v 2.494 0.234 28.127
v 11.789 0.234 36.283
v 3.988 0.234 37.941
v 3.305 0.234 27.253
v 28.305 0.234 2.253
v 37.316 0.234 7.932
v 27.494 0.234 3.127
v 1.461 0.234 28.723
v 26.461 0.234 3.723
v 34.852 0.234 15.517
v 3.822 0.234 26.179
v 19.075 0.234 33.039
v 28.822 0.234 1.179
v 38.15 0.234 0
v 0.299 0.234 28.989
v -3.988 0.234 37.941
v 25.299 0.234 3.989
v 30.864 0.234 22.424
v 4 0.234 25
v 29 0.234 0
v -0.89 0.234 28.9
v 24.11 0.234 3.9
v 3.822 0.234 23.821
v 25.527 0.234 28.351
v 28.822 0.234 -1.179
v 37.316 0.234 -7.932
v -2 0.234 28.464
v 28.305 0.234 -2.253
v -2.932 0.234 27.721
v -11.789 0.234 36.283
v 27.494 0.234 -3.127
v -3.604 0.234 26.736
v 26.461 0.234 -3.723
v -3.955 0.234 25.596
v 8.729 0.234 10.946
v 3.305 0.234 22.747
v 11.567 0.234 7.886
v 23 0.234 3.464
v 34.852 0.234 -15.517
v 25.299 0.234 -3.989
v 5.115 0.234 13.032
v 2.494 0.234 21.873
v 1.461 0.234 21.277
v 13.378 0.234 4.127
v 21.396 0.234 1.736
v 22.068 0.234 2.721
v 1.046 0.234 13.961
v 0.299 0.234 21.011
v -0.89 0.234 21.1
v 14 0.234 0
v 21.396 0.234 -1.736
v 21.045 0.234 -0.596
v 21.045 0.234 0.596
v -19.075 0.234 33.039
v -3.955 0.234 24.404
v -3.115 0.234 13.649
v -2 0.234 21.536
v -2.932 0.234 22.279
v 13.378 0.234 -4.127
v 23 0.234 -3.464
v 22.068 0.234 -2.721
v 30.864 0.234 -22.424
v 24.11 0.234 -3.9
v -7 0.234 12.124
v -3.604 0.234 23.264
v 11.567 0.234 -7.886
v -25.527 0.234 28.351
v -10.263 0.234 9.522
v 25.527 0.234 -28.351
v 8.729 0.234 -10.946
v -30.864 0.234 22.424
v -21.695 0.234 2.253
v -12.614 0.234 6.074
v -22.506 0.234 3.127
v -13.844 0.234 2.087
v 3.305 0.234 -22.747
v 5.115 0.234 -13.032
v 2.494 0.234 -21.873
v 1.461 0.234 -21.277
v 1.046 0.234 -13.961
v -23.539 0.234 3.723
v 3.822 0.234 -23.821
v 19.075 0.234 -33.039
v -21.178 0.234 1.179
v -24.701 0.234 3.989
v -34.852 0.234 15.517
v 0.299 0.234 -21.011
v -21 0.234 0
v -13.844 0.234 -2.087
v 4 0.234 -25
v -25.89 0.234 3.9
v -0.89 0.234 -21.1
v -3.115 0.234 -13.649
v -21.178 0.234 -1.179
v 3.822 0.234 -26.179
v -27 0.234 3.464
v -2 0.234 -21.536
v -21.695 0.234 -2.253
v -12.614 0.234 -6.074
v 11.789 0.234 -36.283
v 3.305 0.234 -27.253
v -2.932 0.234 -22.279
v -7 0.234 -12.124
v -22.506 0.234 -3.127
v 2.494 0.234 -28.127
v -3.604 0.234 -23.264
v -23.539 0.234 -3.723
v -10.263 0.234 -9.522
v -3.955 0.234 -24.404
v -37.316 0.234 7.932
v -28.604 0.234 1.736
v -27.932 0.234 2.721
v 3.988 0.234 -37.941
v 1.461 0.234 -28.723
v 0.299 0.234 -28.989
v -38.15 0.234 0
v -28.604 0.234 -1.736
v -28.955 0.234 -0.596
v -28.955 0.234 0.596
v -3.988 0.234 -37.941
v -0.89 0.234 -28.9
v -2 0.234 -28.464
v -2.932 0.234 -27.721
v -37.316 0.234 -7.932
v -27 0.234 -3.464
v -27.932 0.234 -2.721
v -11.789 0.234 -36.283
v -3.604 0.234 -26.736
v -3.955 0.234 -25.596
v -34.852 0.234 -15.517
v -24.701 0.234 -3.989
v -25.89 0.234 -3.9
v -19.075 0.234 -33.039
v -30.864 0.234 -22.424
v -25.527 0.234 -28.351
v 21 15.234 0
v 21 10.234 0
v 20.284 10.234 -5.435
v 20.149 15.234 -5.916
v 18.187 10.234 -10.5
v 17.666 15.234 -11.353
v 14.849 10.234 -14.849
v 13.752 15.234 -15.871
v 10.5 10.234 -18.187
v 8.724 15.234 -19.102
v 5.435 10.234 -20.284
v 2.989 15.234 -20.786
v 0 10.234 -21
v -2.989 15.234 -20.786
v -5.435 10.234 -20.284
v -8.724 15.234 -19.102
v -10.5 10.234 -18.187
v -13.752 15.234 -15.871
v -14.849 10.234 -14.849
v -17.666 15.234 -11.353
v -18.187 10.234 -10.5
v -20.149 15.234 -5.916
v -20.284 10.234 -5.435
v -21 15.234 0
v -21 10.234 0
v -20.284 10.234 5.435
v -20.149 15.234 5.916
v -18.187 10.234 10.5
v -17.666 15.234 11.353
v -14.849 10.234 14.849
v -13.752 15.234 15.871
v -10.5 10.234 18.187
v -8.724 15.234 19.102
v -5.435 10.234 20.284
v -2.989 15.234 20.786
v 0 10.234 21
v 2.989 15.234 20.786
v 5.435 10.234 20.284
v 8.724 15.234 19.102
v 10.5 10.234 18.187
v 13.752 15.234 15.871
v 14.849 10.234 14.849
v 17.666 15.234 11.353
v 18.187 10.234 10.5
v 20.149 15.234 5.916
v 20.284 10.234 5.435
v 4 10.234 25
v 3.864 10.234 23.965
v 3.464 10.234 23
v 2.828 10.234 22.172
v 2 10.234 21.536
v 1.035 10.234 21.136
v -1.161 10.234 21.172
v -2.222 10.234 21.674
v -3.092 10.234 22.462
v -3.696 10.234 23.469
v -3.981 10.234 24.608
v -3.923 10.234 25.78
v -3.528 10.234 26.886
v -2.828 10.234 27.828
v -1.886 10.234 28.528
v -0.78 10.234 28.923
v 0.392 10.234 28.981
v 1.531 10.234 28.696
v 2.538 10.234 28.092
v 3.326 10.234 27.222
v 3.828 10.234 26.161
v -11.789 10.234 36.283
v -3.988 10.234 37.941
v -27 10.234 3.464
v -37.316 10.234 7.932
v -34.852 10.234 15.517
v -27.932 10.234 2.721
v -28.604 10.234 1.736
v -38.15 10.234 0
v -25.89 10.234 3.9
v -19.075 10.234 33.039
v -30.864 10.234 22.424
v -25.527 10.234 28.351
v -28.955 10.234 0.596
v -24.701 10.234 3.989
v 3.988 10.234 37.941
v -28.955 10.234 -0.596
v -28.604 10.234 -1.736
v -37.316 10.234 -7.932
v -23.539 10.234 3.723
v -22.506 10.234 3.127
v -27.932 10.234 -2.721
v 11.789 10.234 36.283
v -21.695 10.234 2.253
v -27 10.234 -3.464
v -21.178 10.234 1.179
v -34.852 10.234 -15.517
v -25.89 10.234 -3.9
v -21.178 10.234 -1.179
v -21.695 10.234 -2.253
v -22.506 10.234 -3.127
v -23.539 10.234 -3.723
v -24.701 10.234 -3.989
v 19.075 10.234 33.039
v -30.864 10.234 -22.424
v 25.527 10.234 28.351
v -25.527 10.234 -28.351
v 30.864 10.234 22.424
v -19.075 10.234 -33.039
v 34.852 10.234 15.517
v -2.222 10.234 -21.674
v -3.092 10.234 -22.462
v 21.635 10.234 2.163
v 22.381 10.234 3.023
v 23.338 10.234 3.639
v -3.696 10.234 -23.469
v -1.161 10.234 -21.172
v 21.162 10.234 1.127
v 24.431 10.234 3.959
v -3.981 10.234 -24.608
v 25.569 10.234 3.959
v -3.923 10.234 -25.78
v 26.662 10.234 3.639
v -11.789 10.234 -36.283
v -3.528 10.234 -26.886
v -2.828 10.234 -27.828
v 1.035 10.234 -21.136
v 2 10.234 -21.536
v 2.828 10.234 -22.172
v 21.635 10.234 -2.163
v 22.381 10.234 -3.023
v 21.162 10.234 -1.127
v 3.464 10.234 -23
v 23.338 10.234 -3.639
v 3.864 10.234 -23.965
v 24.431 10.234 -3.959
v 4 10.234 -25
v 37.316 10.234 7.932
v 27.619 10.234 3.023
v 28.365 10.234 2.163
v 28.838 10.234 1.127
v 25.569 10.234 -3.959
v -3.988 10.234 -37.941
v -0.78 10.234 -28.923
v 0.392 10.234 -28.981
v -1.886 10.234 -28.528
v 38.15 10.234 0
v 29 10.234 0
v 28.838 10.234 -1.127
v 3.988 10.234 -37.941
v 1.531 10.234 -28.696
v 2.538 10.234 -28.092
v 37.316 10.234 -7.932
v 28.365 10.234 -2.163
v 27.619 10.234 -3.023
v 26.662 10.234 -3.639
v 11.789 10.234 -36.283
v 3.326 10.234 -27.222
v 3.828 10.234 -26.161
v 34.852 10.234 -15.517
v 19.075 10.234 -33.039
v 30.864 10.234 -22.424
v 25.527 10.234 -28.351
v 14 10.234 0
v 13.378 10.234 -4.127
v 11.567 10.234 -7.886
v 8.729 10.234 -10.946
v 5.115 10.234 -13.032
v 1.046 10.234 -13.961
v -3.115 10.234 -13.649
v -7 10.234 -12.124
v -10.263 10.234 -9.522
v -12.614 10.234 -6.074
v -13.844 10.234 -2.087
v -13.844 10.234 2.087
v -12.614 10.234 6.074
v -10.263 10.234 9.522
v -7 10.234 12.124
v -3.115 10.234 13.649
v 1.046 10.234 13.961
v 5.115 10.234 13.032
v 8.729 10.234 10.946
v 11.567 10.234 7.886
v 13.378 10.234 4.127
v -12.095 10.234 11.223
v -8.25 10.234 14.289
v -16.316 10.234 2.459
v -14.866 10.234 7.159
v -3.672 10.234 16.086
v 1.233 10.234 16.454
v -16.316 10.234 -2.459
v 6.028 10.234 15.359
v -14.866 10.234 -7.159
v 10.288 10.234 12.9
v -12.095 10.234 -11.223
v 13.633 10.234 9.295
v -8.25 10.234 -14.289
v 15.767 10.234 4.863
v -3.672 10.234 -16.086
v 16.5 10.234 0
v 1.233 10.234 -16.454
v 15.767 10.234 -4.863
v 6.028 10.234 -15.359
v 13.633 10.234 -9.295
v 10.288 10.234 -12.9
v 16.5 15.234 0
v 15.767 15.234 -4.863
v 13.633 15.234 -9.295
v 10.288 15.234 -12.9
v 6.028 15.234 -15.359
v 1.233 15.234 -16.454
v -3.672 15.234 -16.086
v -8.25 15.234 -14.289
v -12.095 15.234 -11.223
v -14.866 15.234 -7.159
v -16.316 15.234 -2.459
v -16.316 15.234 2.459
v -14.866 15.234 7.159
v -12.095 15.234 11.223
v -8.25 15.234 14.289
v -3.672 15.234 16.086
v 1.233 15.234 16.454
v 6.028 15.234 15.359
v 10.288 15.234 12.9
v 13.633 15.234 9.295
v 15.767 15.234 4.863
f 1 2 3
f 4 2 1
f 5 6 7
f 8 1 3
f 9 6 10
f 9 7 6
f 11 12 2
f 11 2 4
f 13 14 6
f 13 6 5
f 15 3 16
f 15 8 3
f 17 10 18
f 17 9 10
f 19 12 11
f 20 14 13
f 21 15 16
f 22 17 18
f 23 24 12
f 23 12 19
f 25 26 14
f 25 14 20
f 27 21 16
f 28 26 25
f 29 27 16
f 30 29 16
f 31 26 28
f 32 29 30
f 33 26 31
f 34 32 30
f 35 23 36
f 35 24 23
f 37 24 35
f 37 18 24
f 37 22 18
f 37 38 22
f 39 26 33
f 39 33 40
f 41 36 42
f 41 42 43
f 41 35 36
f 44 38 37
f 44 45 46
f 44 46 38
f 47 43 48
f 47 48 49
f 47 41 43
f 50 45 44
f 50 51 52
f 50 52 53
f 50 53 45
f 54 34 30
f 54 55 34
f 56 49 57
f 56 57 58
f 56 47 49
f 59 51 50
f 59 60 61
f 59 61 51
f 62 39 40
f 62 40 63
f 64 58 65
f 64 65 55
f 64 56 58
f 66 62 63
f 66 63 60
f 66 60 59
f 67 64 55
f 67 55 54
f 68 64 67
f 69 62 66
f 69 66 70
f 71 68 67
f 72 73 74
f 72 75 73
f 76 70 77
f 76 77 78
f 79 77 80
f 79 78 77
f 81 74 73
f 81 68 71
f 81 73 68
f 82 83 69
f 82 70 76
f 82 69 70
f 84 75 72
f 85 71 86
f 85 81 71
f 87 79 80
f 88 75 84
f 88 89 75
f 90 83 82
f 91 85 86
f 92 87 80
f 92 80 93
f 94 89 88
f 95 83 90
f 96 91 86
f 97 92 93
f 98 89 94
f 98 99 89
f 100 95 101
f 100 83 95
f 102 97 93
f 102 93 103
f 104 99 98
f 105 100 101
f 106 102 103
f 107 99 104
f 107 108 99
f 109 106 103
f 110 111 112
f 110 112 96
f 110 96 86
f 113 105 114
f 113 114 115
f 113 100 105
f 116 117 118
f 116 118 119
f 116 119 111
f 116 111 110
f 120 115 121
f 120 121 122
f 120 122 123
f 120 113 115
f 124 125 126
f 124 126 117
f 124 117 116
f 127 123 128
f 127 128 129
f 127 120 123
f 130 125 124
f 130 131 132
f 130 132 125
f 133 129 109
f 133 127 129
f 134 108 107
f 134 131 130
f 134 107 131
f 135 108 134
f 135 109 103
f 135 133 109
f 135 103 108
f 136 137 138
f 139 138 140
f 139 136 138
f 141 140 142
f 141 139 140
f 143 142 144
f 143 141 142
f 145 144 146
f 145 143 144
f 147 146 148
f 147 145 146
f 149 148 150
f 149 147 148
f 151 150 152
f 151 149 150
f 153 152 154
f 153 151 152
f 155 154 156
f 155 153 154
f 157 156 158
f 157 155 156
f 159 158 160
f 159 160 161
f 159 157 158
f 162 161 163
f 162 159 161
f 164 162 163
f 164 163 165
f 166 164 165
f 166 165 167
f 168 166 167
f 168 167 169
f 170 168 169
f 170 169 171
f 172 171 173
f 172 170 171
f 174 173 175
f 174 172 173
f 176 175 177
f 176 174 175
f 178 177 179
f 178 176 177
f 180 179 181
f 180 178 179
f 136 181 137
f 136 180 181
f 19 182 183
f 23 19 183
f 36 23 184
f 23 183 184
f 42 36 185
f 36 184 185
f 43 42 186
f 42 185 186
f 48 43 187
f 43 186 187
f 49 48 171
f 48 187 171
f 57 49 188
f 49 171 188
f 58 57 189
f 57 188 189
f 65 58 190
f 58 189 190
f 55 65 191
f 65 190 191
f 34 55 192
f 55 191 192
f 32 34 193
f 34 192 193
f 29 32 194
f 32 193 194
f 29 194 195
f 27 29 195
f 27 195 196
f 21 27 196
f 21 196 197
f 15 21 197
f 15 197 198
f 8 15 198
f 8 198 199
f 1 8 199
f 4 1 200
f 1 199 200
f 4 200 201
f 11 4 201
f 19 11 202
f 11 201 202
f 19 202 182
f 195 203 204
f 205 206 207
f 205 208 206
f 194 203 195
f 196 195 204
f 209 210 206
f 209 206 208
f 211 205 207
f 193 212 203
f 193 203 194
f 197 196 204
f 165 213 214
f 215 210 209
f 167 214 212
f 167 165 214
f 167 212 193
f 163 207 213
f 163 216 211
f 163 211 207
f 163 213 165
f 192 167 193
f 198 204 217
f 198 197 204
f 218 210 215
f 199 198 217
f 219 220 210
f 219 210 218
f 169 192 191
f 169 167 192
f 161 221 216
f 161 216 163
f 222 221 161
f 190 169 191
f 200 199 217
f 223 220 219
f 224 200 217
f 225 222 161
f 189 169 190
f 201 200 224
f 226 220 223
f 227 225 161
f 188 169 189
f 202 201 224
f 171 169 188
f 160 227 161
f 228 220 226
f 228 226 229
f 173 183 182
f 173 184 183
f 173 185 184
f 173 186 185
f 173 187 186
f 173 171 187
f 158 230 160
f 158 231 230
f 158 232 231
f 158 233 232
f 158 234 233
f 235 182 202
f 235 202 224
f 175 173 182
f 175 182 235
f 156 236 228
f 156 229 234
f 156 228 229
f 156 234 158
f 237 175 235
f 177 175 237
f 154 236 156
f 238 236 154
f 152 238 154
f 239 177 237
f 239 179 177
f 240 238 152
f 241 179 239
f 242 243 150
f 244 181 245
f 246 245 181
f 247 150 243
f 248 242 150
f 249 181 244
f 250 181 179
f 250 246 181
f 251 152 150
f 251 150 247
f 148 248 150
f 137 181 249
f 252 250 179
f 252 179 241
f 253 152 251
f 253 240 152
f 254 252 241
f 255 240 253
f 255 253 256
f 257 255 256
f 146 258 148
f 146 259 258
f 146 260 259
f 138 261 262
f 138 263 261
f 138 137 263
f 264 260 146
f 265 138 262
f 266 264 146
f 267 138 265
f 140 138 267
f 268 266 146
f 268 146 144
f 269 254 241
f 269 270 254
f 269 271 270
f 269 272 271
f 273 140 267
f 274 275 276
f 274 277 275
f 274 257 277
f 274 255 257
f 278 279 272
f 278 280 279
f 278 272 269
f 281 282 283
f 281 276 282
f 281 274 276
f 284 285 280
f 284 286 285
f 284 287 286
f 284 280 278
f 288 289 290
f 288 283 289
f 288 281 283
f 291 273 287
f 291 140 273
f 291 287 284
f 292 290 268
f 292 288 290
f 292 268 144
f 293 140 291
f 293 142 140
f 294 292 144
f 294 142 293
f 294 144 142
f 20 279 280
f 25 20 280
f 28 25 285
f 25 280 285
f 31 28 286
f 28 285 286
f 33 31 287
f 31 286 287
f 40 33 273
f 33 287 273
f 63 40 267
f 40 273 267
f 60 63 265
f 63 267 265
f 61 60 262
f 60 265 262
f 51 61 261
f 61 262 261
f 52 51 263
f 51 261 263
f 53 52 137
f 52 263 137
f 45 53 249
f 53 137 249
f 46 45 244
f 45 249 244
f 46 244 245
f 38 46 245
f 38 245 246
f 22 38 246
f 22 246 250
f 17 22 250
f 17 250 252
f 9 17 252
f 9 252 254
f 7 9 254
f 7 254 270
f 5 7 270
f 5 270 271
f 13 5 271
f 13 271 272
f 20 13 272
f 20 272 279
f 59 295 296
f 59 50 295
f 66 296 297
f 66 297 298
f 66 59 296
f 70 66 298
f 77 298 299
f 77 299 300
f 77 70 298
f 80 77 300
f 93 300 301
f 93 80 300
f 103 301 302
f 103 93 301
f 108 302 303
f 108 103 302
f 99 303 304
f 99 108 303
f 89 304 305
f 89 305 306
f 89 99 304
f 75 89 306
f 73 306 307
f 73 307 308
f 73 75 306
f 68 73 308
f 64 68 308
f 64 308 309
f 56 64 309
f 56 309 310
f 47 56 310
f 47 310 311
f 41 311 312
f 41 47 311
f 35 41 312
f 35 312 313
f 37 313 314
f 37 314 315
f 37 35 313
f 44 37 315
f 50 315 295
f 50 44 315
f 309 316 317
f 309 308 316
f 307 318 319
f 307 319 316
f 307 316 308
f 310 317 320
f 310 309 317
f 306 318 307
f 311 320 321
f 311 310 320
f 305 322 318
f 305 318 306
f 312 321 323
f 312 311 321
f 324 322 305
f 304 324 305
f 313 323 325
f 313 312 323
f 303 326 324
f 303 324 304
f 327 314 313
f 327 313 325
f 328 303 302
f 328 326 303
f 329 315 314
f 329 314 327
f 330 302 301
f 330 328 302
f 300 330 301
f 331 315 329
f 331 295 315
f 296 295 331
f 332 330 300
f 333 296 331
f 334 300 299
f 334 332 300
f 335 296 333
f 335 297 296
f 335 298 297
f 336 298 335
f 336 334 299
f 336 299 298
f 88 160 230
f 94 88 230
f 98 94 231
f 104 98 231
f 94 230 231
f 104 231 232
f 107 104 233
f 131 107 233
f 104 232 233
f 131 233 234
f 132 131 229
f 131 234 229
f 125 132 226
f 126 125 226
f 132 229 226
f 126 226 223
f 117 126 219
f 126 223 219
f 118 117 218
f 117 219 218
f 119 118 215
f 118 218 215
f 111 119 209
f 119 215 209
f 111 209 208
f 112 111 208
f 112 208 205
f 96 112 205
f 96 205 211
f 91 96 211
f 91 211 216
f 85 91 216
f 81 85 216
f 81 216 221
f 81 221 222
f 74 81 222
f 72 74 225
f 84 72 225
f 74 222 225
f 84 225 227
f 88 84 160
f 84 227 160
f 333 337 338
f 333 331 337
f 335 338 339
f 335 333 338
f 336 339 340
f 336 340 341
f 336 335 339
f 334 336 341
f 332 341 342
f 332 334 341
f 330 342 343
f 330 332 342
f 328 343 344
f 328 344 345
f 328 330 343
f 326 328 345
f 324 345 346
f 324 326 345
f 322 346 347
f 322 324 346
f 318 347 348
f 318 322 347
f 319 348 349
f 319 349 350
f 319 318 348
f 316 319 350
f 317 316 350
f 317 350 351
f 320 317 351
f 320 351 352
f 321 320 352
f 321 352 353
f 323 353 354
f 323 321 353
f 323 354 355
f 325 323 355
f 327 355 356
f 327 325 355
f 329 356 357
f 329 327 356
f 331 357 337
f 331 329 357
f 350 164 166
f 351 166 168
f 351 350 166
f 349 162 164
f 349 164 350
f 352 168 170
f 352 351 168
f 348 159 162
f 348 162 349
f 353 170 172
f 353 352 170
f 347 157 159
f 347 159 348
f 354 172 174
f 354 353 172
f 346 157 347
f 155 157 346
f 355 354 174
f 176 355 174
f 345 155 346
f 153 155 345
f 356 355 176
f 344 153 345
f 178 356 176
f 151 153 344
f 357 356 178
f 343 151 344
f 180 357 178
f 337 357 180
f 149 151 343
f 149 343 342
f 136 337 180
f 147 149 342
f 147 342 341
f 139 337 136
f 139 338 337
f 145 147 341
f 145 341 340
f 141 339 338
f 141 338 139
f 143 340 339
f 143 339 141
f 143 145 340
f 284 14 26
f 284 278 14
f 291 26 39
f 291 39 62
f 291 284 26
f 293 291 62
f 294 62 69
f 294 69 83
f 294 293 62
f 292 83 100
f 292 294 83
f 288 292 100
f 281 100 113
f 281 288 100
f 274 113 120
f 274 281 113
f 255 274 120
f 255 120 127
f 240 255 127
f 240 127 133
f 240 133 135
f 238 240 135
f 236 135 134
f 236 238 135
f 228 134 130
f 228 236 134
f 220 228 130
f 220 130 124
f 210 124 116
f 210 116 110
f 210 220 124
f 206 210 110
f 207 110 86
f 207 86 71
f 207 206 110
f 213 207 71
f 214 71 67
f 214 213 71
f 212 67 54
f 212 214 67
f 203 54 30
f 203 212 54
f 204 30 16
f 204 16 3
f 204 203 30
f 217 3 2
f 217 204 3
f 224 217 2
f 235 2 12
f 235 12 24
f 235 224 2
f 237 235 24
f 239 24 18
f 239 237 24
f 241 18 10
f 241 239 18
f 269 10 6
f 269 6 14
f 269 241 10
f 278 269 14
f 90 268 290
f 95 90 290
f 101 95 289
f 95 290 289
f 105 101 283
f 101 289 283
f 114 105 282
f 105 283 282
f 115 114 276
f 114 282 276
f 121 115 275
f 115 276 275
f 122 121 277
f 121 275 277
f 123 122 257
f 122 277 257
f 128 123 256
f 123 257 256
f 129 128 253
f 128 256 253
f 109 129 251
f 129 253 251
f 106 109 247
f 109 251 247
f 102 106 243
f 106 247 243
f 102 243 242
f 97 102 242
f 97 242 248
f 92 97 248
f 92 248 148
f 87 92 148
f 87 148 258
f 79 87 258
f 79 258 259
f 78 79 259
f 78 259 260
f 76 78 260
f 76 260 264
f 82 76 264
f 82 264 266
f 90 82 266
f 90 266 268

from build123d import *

# Parameters (mm, degrees)
SKETCH14_R         = 4
CUT_EXTRUDE2_DEPTH = 10


with BuildPart() as part:
    # Sketch1 → Revolve2 (revolve)
    with BuildSketch(Plane.XY):
        Polygon((14, 0.233571738), (38.150093927, 0.233571738), (38.150093927, 10.233571738), (21, 10.233571738), (21, 15.233571738), (16.5, 15.233571738), (16.5, 10.233571738), (14, 10.233571738), align=None)
    revolve(axis=Axis((0, 0, 0), (0, 1, 0)))

    # Sketch14 → Cut-Extrude2 (cut)
    with BuildSketch(Plane(origin=(0, 10.233571738, 0), x_dir=(1, 0, 0), z_dir=(0, 1, 0))):
        with Locations((25, 0)):
            Circle(SKETCH14_R)
        with Locations((0, 25)):
            Circle(SKETCH14_R)
        with Locations((-25, 0)):
            Circle(SKETCH14_R)
        with Locations((0, -25)):
            Circle(SKETCH14_R)
    extrude(amount=-CUT_EXTRUDE2_DEPTH, mode=Mode.SUBTRACT)


solid = part.part
